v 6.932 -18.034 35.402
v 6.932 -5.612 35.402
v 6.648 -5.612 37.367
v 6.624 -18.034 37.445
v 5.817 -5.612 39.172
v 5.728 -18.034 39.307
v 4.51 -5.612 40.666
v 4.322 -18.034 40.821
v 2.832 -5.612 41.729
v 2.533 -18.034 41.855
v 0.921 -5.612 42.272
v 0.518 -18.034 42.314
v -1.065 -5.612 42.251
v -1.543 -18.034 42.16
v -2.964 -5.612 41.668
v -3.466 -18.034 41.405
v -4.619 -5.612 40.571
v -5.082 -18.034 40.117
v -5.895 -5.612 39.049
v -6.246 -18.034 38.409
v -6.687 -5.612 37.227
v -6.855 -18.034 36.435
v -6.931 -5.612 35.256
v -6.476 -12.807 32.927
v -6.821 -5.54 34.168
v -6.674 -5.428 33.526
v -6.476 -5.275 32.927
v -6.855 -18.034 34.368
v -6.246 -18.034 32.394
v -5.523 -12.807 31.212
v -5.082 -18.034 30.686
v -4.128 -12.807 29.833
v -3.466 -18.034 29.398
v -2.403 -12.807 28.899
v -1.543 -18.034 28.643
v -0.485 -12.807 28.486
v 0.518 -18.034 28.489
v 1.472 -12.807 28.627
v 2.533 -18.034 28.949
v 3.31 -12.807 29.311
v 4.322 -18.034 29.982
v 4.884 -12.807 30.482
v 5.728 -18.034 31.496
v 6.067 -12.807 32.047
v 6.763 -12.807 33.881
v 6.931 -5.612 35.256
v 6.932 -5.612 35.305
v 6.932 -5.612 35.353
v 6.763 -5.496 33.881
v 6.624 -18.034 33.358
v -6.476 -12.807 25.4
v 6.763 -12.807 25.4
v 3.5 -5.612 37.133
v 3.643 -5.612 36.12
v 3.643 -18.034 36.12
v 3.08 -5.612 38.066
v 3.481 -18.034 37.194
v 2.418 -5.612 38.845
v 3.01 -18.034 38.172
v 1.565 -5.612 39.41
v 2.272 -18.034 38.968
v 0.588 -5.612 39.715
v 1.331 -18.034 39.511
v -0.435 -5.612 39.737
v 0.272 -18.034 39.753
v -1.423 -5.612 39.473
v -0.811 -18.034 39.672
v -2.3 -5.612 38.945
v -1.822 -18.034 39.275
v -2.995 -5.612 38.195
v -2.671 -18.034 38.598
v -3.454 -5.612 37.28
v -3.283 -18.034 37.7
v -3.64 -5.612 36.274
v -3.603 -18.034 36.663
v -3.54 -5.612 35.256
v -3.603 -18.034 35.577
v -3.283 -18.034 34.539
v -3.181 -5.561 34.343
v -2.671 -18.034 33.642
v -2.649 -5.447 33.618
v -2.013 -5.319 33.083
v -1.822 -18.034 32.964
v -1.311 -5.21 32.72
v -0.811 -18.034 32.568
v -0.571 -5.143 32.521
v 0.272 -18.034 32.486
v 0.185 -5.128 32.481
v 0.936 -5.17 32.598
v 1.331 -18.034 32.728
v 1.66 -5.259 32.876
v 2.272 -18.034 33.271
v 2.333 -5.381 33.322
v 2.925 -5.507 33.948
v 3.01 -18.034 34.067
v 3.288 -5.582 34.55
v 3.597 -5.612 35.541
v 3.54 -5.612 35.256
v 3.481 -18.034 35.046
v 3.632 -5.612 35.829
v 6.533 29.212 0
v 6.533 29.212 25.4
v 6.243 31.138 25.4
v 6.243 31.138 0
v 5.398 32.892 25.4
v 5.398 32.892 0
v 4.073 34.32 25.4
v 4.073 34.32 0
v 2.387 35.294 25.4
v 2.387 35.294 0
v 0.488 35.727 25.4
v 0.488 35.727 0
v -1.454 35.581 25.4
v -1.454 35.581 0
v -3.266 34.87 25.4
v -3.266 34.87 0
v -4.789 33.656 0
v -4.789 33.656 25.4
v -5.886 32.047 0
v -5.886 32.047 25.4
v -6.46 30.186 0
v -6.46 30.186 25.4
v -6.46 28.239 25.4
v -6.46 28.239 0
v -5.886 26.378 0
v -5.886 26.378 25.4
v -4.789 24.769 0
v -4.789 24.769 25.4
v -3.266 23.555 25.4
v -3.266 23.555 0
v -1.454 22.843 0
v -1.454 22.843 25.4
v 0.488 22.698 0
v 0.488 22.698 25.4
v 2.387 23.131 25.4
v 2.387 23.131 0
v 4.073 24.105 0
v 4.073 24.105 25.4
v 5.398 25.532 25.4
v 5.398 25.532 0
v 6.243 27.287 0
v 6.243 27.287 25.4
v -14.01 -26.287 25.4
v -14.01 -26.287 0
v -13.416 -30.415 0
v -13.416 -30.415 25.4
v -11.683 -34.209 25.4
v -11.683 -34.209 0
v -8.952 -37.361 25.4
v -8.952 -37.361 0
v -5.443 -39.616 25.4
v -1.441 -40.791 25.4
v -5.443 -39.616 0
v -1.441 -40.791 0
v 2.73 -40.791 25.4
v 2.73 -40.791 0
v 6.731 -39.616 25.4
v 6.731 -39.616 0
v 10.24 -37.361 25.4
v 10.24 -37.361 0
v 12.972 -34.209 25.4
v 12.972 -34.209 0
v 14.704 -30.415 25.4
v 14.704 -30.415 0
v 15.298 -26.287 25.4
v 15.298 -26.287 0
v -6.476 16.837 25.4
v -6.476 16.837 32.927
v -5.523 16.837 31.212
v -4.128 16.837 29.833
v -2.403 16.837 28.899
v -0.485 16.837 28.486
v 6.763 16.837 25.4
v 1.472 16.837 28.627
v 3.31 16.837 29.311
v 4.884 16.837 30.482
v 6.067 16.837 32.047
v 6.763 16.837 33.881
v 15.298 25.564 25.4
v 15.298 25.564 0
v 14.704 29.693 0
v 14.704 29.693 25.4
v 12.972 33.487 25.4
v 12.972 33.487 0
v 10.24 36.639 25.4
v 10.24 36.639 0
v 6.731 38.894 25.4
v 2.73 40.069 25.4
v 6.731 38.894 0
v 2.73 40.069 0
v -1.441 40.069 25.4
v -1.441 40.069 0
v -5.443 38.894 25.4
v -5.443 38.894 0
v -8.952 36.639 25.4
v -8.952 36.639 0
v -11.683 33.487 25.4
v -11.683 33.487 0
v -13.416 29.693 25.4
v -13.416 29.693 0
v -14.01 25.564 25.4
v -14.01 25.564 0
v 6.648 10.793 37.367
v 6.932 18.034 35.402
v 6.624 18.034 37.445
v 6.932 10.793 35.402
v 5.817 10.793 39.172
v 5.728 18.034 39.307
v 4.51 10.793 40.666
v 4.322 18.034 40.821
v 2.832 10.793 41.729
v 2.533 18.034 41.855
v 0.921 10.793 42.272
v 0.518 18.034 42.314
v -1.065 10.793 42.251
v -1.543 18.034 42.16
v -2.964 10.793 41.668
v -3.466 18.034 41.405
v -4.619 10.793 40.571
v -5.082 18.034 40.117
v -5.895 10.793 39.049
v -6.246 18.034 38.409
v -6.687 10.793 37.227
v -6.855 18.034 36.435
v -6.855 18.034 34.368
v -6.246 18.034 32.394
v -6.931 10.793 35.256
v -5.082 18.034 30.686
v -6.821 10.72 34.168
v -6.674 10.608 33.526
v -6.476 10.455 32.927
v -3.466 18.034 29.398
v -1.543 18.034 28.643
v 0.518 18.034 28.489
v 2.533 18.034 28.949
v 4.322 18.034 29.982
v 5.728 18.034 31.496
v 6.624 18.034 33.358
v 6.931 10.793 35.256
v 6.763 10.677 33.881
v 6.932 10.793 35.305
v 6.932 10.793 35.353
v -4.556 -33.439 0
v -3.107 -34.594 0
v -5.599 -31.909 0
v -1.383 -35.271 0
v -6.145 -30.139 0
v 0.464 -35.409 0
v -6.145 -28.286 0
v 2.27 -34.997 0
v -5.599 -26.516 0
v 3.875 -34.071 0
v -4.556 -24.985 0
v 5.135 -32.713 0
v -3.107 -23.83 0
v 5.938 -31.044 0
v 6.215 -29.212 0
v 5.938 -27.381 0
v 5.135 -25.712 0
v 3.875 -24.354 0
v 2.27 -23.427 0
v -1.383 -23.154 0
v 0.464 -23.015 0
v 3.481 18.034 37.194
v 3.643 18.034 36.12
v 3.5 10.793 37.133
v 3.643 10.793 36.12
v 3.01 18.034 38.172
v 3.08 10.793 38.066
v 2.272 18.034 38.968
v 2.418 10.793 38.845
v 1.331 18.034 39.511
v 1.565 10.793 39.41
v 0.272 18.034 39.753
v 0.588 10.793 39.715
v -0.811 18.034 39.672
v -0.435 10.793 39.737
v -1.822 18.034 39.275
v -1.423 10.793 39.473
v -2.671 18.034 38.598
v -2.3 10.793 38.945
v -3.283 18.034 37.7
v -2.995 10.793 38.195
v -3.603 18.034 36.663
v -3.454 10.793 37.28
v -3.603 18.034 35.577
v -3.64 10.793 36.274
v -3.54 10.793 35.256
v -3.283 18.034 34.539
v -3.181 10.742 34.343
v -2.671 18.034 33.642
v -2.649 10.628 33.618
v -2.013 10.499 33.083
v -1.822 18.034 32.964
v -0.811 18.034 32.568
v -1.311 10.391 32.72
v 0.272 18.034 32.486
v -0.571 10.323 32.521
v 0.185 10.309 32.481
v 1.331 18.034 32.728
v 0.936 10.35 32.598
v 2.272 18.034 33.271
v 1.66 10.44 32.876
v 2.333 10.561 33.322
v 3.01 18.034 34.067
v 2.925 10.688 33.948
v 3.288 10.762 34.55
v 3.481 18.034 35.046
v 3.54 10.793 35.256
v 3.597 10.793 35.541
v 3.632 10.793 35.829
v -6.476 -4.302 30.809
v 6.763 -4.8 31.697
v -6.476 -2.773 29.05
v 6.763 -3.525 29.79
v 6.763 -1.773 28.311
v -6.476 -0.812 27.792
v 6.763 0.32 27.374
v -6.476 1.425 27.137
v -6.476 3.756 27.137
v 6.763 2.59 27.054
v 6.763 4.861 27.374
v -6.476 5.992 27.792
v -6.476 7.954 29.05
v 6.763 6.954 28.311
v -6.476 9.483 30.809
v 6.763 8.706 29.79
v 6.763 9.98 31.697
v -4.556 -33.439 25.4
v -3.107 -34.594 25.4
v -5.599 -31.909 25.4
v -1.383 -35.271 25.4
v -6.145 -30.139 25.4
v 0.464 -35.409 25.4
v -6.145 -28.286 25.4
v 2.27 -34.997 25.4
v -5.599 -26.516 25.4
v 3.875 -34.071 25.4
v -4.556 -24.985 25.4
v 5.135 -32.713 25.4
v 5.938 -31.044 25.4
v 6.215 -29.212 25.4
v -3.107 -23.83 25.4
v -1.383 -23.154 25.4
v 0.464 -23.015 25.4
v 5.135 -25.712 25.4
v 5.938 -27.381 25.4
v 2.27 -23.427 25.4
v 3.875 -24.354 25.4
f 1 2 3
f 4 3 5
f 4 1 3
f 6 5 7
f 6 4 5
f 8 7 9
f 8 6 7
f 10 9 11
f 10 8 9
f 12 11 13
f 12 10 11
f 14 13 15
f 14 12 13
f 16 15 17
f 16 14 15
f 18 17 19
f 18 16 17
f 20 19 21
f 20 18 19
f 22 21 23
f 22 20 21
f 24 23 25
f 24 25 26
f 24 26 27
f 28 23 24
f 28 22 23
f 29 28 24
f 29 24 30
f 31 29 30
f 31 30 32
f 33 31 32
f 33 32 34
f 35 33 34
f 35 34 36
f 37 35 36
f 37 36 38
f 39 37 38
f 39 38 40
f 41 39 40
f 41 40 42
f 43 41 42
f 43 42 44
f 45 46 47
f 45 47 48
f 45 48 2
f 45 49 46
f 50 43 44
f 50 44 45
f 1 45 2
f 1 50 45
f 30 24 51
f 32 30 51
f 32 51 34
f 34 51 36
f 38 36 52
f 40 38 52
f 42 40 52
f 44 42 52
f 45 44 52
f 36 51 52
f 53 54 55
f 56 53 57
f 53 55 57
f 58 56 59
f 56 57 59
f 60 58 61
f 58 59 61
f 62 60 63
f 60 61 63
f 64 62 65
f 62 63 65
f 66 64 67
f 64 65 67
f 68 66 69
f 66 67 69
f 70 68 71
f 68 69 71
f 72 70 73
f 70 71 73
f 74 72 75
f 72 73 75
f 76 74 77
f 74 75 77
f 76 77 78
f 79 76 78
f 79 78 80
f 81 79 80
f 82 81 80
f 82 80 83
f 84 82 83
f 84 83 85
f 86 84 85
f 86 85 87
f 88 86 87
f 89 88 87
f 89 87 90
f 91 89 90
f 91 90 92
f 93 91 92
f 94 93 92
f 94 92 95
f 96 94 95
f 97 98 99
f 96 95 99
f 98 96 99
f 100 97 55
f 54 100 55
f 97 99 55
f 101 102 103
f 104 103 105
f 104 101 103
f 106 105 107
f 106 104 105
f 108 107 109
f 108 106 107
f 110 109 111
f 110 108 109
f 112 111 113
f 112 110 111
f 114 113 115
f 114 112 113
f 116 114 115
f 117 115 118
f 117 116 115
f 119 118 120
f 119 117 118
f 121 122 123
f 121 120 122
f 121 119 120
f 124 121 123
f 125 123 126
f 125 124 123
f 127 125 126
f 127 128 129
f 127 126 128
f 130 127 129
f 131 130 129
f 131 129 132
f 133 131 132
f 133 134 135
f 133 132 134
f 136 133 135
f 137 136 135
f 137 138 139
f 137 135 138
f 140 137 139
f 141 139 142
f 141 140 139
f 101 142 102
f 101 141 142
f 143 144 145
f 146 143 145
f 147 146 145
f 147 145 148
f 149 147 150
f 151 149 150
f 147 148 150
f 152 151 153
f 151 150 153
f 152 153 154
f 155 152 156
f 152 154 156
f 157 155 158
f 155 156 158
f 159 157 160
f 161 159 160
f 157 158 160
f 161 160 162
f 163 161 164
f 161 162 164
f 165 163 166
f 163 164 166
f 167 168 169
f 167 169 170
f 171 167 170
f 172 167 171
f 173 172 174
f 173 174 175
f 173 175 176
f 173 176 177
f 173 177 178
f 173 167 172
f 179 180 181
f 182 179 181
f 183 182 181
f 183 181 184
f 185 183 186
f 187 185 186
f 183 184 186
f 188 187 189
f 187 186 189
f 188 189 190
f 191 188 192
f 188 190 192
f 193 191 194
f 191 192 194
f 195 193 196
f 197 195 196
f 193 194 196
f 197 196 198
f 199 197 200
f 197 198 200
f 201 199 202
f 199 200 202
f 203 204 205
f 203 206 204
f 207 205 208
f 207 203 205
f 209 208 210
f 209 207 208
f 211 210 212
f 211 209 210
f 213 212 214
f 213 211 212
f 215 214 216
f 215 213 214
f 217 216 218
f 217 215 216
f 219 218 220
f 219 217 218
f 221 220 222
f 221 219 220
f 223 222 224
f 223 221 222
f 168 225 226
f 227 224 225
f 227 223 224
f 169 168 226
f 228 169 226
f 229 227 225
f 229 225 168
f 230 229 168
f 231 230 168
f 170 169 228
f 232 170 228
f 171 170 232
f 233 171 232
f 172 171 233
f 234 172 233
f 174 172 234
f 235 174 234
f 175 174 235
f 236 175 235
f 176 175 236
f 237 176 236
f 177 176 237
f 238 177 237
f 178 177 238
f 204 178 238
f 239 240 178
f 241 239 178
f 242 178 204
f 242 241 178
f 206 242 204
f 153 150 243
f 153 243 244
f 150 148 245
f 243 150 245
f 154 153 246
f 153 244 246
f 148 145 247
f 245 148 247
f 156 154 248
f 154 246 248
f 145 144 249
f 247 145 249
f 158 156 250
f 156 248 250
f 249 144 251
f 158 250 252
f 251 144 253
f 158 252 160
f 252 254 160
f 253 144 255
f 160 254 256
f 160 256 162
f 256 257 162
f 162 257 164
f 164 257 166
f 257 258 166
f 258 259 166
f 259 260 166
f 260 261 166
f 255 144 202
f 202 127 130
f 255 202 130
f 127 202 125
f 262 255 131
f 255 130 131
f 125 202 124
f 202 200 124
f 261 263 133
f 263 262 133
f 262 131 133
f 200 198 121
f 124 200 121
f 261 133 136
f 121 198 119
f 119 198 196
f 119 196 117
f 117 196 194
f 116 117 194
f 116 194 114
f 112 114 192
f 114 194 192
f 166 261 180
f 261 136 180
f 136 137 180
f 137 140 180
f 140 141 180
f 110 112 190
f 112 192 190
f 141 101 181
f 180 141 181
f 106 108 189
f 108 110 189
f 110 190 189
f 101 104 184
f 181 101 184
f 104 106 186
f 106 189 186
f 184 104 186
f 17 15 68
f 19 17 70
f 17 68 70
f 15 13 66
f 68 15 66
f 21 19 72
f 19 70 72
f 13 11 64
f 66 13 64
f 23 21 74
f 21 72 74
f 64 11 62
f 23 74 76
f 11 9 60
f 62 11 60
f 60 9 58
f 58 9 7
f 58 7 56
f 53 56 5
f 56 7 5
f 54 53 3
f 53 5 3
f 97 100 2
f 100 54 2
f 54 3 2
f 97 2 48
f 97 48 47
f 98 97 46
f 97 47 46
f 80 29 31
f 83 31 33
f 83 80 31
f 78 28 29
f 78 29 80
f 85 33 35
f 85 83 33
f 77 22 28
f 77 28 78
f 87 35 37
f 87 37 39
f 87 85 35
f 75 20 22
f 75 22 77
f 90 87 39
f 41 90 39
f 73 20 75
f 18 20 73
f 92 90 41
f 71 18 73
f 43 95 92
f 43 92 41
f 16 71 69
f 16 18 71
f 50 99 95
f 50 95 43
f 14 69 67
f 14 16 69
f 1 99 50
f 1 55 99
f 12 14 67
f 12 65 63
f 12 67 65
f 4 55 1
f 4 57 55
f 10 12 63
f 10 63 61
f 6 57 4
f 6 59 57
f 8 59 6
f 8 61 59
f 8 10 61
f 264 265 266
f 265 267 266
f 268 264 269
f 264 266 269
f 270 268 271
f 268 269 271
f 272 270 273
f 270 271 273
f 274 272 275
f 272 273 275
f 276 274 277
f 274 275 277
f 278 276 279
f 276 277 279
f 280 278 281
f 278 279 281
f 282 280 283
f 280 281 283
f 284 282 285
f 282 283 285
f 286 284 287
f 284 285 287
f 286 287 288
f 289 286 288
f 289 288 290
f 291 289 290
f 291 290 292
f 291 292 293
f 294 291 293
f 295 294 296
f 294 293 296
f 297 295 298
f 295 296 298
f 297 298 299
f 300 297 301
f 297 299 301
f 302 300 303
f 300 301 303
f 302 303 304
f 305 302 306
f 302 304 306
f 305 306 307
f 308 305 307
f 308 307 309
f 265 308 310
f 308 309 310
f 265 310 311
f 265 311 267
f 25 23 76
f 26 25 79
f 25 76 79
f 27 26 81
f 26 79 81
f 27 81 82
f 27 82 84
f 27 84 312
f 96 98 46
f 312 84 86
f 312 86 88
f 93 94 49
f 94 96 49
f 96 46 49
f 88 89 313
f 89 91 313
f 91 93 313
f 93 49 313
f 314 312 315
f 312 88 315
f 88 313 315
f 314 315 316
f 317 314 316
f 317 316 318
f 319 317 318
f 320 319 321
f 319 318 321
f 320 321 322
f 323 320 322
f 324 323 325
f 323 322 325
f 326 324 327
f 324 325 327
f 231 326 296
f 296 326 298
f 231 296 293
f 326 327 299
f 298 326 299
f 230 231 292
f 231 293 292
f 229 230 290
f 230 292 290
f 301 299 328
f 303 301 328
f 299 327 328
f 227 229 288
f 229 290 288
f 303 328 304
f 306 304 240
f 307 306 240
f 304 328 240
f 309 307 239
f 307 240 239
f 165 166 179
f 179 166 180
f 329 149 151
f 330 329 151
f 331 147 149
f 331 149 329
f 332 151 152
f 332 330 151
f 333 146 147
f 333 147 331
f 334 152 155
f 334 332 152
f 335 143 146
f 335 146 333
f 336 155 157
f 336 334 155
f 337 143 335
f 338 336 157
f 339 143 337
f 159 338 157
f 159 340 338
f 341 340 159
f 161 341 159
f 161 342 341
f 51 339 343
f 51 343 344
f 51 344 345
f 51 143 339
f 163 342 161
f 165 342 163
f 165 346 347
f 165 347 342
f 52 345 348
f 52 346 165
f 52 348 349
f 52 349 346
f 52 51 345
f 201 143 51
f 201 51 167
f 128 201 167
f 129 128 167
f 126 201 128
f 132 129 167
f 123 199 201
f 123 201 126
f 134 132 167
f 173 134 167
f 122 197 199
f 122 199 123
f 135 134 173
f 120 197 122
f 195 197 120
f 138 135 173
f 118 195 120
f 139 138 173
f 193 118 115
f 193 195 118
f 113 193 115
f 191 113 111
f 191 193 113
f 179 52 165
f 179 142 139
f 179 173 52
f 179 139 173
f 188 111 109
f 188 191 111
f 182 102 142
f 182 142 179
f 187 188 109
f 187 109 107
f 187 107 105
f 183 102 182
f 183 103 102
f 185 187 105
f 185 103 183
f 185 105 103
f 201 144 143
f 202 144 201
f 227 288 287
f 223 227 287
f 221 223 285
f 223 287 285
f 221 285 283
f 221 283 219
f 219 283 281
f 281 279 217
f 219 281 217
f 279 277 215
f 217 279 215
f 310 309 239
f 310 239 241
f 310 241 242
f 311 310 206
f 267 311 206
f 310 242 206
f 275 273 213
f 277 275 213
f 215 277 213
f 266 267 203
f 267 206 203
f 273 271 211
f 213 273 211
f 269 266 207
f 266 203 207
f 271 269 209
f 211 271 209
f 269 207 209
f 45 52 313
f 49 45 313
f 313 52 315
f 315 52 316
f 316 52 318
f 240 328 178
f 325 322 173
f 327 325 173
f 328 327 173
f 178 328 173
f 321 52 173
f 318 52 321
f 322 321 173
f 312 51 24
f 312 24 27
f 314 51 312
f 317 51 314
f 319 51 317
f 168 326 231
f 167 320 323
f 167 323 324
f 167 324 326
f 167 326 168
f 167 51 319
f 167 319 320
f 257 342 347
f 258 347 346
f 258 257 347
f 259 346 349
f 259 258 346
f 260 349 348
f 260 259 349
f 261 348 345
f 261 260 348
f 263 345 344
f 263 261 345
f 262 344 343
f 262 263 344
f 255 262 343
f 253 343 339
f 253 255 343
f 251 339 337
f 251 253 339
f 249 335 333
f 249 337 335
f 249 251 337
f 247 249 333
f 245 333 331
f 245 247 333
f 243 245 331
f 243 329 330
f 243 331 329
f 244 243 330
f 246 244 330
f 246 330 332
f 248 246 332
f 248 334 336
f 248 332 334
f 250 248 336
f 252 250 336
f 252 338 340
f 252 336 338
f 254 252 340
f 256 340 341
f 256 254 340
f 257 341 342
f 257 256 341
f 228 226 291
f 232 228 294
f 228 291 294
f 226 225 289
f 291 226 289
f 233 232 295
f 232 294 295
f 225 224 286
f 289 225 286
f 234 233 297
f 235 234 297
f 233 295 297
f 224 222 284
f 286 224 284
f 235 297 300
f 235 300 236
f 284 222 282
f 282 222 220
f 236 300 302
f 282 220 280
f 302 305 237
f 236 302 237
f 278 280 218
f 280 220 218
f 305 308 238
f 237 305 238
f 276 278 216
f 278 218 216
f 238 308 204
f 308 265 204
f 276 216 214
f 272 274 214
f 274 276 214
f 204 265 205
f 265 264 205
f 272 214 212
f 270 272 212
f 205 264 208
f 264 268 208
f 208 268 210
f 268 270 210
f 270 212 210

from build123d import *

# Parameters (mm, degrees)
F0_W      = 29.3072769418
F0_H      = 51.8513377756
F1_DEPTH  = 25.4
F2_R      = 6.2145404026
F2_R_2    = 6.5329388007
F3_DEPTH  = 73.914
F4_W      = 13.2390642539
F4_H      = 29.6439919621
F5_DEPTH  = 36.322
F6_R      = 6.9321854406
F7_DEPTH  = 18.034
F9_DEPTH  = 24.892
F10_R     = 3.6433318827
F11_DEPTH = 55.88


with BuildPart() as f1:
    # F0 (on Top) → F1 (new body)
    with BuildSketch(Plane.XY):
        with Locations((0.6441161968, -0.3612739965)):
            Rectangle(F0_W, F0_H)
        with BuildLine():
            Line((15.2977546677, -26.2869428843), (-14.0095222741, -26.2869428843))
            ThreePointArc((-14.0095222741, -26.2869428843), (0.6441161968, -40.9405813552), (15.2977546677, -26.2869428843))
        make_face()
        with BuildLine():
            ThreePointArc((15.2977546677, 25.5643948913), (0.6441161968, 40.2180333622), (-14.0095222741, 25.5643948913))
            Line((-14.0095222741, 25.5643948913), (15.2977546677, 25.5643948913))
        make_face()
    extrude(amount=F1_DEPTH)

    # F2 (on Top) → F3 (cut)
    with BuildSketch(Plane.XY):
        with Locations((0, -29.2122848332)):
            Circle(F2_R)
        with Locations((0, 29.2122848332)):
            Circle(F2_R_2)
    extrude(amount=F3_DEPTH, mode=Mode.SUBTRACT)

    # F4 (on Top) → F5 (join)
    with BuildSketch(Plane.XY):
        with Locations((0.1439033076, 2.0146397874)):
            Rectangle(F4_W, F4_H)
    extrude(amount=F5_DEPTH)

    # F6 (on Front) → F7 (join, symmetric)
    with BuildSketch(Plane.XZ):
        with Locations((0, 35.4015231133)):
            Circle(F6_R)
    extrude(amount=F7_DEPTH, both=True)

    # F8 (on Right) → F9 (cut, symmetric)
    with BuildSketch(Plane.YZ):
        with BuildLine():
            Line((-1.3480700781, 42.4513481557), (-5.6122136302, 42.4513481557))
            Line((-5.6122136302, 42.4513481557), (-5.6122136302, 35.2562069893))
            ThreePointArc((-5.6122136302, 35.2562069893), (-4.4661066114, 39.4381017942), (-1.3480700781, 42.4513481557))
        make_face()
        with BuildLine():
            ThreePointArc((6.5285728542, 42.4513481557), (2.590251388, 43.4586720075), (-1.3480700781, 42.4513481557))
            Line((-1.3480700781, 42.4513481557), (6.5285728542, 42.4513481557))
        make_face()
        with BuildLine():
            Line((6.5285728542, 42.4513481557), (-1.3480700781, 42.4513481557))
            ThreePointArc((-1.3480700781, 42.4513481557), (-4.4661066114, 39.4381017942), (-5.6122136302, 35.2562069893))
            Line((-5.6122136302, 35.2562069893), (10.7927164063, 35.2562069893))
            ThreePointArc((10.7927164063, 35.2562069893), (9.6466093875, 39.4381017942), (6.5285728542, 42.4513481557))
        make_face()
        with BuildLine():
            Line((10.7927164063, 35.2562069893), (-5.6122136302, 35.2562069893))
            ThreePointArc((-5.6122136302, 35.2562069893), (2.590251388, 27.053741971), (10.7927164063, 35.2562069893))
        make_face()
        with BuildLine():
            Line((10.7927164063, 42.4513481557), (6.5285728542, 42.4513481557))
            ThreePointArc((6.5285728542, 42.4513481557), (9.6466093875, 39.4381017942), (10.7927164063, 35.2562069893))
            Line((10.7927164063, 35.2562069893), (10.7927164063, 42.4513481557))
        make_face()
    extrude(amount=F9_DEPTH, both=True, mode=Mode.SUBTRACT)

    # F10 (on Front) → F11 (cut, symmetric)
    with BuildSketch(Plane.XZ):
        with Locations((0, 36.1196212471)):
            Circle(F10_R)
    extrude(amount=F11_DEPTH, both=True, mode=Mode.SUBTRACT)


solid = f1.part
